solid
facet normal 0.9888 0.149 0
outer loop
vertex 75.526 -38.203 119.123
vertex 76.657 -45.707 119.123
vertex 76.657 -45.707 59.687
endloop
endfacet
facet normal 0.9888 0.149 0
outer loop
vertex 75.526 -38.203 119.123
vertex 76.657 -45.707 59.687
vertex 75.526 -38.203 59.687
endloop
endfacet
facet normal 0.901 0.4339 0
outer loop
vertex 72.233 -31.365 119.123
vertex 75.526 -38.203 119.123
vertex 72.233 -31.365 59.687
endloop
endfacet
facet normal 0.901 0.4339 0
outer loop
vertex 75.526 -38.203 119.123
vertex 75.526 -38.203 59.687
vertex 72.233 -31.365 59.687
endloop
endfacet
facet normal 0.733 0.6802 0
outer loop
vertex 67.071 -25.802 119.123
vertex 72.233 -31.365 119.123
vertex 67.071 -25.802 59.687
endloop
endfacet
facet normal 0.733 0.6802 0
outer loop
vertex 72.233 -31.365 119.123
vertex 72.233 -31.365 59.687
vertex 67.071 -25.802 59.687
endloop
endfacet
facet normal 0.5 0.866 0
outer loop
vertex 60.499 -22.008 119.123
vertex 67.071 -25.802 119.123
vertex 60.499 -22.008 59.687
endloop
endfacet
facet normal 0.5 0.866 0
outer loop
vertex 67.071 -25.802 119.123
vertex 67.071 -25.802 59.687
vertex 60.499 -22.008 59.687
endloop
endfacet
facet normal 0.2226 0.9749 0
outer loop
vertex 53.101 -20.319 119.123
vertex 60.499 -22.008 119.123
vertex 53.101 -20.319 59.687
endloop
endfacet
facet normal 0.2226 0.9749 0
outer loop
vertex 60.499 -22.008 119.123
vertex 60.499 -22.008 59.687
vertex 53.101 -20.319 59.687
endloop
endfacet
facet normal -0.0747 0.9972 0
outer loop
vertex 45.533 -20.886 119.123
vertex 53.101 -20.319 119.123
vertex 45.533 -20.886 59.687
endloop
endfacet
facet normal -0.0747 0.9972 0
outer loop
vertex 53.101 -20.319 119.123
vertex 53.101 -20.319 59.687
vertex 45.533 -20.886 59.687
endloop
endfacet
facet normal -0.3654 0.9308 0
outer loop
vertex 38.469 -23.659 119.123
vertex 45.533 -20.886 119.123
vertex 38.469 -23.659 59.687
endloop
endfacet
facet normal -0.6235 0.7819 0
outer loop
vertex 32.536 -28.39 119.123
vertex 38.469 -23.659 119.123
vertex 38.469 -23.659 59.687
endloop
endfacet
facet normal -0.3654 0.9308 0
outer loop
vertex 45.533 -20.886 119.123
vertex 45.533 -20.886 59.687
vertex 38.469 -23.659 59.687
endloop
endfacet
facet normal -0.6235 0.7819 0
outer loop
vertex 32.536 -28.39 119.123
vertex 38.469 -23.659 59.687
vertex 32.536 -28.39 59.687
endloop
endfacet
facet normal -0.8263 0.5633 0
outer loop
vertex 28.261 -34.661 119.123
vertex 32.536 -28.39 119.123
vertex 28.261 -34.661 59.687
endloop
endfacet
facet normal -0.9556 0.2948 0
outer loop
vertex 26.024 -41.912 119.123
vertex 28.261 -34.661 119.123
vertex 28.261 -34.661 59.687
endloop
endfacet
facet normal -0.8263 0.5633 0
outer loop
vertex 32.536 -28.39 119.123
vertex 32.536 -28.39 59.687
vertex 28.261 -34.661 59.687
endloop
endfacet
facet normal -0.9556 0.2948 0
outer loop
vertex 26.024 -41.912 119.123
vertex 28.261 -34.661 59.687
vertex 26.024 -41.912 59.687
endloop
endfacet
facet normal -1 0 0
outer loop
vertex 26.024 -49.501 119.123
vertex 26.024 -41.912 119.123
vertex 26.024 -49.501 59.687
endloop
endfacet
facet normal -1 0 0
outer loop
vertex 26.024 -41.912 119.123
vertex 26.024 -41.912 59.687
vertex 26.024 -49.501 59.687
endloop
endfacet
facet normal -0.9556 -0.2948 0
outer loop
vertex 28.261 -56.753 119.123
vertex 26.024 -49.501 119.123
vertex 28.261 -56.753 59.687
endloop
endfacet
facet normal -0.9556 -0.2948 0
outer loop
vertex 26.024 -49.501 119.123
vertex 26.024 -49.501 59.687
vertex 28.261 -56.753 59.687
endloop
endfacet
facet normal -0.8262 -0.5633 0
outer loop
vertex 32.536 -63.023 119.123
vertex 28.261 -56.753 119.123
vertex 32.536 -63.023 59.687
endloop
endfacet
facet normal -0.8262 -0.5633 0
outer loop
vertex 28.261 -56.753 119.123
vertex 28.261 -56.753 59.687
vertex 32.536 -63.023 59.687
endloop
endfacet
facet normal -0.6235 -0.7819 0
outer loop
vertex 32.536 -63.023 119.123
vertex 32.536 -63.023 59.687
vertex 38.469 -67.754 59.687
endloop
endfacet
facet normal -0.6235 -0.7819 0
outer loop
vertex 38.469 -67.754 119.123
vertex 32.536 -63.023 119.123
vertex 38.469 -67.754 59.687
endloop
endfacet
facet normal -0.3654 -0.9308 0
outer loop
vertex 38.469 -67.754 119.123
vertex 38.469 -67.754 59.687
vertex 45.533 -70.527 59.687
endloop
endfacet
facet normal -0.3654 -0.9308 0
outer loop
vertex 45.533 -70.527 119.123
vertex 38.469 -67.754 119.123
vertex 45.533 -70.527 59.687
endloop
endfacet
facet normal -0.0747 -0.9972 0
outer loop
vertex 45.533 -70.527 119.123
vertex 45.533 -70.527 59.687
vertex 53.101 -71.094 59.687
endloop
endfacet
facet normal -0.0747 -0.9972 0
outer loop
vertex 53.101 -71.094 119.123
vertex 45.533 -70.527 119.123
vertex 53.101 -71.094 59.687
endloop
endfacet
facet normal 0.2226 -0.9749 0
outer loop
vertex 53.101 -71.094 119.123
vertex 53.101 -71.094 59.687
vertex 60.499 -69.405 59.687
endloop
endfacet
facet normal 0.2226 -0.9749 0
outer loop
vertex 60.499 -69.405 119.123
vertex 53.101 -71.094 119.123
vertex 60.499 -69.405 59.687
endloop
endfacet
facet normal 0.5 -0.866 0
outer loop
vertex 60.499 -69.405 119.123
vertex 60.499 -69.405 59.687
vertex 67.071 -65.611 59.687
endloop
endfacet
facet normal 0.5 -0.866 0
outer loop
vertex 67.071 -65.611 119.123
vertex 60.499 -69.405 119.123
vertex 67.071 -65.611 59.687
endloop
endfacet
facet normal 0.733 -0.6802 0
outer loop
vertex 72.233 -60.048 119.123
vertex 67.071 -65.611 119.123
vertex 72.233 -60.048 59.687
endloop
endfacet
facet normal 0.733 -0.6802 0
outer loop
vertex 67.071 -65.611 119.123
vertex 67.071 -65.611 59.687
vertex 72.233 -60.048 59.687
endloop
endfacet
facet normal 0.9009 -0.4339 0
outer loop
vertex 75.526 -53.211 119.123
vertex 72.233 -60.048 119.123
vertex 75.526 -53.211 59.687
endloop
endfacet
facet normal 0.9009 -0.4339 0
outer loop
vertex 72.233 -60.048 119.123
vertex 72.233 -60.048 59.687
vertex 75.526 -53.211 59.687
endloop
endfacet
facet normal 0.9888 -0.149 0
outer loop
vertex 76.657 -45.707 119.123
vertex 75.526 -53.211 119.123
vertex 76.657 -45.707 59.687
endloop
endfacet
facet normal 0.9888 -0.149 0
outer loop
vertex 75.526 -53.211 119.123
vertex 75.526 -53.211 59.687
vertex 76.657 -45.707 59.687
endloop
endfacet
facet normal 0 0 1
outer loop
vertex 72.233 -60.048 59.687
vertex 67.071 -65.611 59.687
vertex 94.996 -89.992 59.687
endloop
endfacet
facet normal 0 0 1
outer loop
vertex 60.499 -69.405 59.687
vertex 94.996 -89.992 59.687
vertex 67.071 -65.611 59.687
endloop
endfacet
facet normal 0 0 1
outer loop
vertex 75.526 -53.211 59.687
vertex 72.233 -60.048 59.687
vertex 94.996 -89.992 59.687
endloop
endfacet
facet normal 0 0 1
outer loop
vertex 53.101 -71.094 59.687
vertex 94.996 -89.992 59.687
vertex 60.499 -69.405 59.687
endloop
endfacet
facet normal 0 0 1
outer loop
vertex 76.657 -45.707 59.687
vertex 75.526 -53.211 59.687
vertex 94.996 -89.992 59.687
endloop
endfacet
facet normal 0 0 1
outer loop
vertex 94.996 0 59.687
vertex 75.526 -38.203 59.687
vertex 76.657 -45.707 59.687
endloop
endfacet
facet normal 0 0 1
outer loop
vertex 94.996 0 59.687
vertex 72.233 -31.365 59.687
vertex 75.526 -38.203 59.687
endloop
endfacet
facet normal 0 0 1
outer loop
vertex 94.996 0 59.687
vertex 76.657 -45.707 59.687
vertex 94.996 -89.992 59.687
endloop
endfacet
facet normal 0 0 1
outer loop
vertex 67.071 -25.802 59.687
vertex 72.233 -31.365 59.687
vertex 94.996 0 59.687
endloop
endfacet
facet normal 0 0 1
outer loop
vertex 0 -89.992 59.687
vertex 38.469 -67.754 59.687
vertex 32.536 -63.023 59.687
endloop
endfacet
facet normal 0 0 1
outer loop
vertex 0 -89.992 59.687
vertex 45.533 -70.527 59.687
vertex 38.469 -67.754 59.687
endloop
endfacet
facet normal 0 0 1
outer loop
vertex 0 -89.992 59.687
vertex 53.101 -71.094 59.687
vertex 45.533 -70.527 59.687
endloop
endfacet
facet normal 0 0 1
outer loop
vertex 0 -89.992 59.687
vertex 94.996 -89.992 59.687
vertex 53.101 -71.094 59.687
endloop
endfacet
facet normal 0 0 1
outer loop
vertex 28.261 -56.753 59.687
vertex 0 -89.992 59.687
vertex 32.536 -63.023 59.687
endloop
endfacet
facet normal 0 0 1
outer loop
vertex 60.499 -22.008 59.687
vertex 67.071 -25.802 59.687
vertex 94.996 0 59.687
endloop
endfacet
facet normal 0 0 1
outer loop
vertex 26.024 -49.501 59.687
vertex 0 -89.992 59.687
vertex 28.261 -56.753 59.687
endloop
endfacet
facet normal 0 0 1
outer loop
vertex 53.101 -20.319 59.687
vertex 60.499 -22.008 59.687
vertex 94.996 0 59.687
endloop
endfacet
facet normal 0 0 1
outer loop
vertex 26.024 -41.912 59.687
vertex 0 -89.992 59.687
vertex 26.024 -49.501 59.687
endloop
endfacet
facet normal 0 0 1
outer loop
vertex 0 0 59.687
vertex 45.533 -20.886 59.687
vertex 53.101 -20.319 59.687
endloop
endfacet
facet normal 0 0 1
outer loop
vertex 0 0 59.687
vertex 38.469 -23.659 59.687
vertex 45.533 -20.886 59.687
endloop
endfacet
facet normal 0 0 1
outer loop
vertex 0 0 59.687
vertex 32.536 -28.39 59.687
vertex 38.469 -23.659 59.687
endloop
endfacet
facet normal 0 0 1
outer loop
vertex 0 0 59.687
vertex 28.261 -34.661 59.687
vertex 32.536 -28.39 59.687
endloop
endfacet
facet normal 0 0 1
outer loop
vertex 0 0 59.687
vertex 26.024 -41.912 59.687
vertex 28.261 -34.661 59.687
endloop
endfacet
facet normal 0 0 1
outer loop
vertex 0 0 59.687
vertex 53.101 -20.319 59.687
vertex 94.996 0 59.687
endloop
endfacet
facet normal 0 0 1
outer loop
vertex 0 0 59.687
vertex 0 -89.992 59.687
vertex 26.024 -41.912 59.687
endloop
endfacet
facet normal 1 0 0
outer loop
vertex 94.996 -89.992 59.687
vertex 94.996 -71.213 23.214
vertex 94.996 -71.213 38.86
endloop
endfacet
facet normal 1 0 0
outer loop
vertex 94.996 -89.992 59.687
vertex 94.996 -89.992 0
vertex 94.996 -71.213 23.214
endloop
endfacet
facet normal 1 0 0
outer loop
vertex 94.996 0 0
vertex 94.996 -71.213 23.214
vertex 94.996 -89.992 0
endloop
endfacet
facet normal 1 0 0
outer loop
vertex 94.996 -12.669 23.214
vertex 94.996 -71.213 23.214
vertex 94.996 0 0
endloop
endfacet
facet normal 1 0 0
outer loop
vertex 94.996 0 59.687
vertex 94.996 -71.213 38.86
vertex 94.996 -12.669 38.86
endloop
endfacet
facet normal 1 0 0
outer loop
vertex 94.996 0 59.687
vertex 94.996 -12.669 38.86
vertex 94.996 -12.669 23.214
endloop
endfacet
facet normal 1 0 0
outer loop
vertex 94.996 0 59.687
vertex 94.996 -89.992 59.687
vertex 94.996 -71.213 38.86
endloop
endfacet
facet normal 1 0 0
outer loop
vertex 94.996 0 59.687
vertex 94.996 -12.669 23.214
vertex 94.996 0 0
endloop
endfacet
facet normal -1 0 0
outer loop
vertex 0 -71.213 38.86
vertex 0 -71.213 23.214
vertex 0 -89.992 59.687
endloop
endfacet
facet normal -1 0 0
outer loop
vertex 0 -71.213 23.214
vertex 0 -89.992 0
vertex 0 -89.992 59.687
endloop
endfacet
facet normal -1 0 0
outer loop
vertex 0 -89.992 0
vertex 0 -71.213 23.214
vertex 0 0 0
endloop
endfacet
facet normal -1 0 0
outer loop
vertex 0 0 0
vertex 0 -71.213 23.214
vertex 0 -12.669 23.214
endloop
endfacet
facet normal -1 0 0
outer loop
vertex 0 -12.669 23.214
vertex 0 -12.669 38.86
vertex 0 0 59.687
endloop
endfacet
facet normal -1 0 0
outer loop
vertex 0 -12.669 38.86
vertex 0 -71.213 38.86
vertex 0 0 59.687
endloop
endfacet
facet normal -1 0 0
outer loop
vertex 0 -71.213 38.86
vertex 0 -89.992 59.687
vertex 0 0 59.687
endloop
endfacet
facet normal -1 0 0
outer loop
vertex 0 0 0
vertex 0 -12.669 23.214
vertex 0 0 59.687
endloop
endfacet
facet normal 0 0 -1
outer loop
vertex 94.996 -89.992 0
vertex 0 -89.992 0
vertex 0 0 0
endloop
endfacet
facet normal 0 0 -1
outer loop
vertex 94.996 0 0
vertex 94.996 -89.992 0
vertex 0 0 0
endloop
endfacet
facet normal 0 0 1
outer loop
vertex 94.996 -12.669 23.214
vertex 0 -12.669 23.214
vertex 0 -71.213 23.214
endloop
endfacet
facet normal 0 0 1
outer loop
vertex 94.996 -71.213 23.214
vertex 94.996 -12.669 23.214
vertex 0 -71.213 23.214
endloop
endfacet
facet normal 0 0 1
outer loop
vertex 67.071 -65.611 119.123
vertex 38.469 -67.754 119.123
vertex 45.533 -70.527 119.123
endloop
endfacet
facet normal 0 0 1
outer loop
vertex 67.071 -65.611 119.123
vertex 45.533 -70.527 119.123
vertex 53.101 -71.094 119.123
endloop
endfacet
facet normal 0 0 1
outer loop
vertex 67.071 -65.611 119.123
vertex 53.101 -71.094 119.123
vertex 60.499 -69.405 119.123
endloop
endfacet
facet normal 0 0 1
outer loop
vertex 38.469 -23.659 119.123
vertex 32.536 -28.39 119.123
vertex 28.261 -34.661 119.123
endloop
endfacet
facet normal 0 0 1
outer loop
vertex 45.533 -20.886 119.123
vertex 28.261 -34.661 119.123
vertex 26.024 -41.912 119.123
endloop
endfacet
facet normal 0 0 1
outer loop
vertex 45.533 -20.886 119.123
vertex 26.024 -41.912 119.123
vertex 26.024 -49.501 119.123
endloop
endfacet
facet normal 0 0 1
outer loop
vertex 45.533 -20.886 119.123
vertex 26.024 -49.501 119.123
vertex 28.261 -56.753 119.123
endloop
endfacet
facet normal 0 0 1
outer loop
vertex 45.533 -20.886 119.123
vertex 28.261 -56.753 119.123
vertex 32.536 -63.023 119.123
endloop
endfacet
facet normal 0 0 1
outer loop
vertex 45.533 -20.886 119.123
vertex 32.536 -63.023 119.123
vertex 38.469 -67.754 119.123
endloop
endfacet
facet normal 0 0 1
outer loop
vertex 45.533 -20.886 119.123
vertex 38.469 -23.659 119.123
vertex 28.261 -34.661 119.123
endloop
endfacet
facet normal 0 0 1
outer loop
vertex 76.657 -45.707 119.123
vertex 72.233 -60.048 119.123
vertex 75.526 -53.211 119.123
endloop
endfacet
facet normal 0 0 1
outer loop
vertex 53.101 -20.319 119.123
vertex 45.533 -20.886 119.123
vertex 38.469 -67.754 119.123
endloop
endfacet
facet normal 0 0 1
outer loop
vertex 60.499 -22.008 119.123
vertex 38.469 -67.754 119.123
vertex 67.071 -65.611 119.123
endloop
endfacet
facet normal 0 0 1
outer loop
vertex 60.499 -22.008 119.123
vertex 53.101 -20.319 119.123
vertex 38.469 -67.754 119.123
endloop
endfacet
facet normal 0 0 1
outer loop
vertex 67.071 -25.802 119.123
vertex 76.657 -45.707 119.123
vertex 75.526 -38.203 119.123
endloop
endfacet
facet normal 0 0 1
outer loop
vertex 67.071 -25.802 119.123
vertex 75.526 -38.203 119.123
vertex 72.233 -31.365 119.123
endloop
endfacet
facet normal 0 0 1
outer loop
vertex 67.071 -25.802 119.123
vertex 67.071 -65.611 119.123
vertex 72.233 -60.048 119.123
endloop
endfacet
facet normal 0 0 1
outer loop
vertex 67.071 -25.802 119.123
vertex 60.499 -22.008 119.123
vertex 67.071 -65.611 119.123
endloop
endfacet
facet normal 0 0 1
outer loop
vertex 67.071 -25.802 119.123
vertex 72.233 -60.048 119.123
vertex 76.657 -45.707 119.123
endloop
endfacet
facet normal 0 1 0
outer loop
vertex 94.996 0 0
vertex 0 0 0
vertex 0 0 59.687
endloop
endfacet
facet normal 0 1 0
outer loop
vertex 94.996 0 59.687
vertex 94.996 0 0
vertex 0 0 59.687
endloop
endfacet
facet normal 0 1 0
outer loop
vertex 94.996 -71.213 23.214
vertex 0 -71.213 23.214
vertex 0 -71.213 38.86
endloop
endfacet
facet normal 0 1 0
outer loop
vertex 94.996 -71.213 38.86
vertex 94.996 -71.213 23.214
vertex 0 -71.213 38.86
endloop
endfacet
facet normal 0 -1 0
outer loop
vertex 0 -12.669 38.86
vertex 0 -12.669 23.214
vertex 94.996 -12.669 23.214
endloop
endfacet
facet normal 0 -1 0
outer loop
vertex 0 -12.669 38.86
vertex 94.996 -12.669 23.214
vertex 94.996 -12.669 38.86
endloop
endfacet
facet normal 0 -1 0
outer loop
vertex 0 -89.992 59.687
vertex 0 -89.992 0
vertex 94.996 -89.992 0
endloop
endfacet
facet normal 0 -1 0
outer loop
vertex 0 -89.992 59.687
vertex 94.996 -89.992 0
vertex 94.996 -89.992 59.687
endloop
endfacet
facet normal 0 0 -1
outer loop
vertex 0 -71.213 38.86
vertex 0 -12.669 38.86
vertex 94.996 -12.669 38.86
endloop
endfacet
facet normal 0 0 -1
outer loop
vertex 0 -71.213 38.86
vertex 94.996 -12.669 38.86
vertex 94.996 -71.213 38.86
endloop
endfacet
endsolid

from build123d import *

# Parameters (mm, degrees)
F0_W     = 89.99192
F0_H     = 59.686664
F1_DEPTH = 94.996
F2_R     = 25.458482
F3_DEPTH = 59.436
F4_W     = 58.544096
F4_H     = 15.645336
F5_DEPTH = 116.078


with BuildPart() as f1:
    # F0 (on Right) → F1 (new body)
    with BuildSketch(Plane.YZ):
        with Locations((-44.99596, 29.843332)):
            Rectangle(F0_W, F0_H)
    extrude(amount=F1_DEPTH)

    # F2 (on face) → F3 (join)
    with BuildSketch(Plane.XY.offset(59.686664)):
        with Locations((51.198136, -45.706607)):
            Circle(F2_R)
    extrude(amount=F3_DEPTH)

    # F4 (on face) → F5 (cut)
    with BuildSketch(Plane(origin=(0, 0, 0), x_dir=(0, -1, 0), z_dir=(-1, 0, 0))):
        with Locations((41.940892, 31.036956)):
            Rectangle(F4_W, F4_H)
    extrude(amount=-F5_DEPTH, mode=Mode.SUBTRACT)


solid = f1.part
